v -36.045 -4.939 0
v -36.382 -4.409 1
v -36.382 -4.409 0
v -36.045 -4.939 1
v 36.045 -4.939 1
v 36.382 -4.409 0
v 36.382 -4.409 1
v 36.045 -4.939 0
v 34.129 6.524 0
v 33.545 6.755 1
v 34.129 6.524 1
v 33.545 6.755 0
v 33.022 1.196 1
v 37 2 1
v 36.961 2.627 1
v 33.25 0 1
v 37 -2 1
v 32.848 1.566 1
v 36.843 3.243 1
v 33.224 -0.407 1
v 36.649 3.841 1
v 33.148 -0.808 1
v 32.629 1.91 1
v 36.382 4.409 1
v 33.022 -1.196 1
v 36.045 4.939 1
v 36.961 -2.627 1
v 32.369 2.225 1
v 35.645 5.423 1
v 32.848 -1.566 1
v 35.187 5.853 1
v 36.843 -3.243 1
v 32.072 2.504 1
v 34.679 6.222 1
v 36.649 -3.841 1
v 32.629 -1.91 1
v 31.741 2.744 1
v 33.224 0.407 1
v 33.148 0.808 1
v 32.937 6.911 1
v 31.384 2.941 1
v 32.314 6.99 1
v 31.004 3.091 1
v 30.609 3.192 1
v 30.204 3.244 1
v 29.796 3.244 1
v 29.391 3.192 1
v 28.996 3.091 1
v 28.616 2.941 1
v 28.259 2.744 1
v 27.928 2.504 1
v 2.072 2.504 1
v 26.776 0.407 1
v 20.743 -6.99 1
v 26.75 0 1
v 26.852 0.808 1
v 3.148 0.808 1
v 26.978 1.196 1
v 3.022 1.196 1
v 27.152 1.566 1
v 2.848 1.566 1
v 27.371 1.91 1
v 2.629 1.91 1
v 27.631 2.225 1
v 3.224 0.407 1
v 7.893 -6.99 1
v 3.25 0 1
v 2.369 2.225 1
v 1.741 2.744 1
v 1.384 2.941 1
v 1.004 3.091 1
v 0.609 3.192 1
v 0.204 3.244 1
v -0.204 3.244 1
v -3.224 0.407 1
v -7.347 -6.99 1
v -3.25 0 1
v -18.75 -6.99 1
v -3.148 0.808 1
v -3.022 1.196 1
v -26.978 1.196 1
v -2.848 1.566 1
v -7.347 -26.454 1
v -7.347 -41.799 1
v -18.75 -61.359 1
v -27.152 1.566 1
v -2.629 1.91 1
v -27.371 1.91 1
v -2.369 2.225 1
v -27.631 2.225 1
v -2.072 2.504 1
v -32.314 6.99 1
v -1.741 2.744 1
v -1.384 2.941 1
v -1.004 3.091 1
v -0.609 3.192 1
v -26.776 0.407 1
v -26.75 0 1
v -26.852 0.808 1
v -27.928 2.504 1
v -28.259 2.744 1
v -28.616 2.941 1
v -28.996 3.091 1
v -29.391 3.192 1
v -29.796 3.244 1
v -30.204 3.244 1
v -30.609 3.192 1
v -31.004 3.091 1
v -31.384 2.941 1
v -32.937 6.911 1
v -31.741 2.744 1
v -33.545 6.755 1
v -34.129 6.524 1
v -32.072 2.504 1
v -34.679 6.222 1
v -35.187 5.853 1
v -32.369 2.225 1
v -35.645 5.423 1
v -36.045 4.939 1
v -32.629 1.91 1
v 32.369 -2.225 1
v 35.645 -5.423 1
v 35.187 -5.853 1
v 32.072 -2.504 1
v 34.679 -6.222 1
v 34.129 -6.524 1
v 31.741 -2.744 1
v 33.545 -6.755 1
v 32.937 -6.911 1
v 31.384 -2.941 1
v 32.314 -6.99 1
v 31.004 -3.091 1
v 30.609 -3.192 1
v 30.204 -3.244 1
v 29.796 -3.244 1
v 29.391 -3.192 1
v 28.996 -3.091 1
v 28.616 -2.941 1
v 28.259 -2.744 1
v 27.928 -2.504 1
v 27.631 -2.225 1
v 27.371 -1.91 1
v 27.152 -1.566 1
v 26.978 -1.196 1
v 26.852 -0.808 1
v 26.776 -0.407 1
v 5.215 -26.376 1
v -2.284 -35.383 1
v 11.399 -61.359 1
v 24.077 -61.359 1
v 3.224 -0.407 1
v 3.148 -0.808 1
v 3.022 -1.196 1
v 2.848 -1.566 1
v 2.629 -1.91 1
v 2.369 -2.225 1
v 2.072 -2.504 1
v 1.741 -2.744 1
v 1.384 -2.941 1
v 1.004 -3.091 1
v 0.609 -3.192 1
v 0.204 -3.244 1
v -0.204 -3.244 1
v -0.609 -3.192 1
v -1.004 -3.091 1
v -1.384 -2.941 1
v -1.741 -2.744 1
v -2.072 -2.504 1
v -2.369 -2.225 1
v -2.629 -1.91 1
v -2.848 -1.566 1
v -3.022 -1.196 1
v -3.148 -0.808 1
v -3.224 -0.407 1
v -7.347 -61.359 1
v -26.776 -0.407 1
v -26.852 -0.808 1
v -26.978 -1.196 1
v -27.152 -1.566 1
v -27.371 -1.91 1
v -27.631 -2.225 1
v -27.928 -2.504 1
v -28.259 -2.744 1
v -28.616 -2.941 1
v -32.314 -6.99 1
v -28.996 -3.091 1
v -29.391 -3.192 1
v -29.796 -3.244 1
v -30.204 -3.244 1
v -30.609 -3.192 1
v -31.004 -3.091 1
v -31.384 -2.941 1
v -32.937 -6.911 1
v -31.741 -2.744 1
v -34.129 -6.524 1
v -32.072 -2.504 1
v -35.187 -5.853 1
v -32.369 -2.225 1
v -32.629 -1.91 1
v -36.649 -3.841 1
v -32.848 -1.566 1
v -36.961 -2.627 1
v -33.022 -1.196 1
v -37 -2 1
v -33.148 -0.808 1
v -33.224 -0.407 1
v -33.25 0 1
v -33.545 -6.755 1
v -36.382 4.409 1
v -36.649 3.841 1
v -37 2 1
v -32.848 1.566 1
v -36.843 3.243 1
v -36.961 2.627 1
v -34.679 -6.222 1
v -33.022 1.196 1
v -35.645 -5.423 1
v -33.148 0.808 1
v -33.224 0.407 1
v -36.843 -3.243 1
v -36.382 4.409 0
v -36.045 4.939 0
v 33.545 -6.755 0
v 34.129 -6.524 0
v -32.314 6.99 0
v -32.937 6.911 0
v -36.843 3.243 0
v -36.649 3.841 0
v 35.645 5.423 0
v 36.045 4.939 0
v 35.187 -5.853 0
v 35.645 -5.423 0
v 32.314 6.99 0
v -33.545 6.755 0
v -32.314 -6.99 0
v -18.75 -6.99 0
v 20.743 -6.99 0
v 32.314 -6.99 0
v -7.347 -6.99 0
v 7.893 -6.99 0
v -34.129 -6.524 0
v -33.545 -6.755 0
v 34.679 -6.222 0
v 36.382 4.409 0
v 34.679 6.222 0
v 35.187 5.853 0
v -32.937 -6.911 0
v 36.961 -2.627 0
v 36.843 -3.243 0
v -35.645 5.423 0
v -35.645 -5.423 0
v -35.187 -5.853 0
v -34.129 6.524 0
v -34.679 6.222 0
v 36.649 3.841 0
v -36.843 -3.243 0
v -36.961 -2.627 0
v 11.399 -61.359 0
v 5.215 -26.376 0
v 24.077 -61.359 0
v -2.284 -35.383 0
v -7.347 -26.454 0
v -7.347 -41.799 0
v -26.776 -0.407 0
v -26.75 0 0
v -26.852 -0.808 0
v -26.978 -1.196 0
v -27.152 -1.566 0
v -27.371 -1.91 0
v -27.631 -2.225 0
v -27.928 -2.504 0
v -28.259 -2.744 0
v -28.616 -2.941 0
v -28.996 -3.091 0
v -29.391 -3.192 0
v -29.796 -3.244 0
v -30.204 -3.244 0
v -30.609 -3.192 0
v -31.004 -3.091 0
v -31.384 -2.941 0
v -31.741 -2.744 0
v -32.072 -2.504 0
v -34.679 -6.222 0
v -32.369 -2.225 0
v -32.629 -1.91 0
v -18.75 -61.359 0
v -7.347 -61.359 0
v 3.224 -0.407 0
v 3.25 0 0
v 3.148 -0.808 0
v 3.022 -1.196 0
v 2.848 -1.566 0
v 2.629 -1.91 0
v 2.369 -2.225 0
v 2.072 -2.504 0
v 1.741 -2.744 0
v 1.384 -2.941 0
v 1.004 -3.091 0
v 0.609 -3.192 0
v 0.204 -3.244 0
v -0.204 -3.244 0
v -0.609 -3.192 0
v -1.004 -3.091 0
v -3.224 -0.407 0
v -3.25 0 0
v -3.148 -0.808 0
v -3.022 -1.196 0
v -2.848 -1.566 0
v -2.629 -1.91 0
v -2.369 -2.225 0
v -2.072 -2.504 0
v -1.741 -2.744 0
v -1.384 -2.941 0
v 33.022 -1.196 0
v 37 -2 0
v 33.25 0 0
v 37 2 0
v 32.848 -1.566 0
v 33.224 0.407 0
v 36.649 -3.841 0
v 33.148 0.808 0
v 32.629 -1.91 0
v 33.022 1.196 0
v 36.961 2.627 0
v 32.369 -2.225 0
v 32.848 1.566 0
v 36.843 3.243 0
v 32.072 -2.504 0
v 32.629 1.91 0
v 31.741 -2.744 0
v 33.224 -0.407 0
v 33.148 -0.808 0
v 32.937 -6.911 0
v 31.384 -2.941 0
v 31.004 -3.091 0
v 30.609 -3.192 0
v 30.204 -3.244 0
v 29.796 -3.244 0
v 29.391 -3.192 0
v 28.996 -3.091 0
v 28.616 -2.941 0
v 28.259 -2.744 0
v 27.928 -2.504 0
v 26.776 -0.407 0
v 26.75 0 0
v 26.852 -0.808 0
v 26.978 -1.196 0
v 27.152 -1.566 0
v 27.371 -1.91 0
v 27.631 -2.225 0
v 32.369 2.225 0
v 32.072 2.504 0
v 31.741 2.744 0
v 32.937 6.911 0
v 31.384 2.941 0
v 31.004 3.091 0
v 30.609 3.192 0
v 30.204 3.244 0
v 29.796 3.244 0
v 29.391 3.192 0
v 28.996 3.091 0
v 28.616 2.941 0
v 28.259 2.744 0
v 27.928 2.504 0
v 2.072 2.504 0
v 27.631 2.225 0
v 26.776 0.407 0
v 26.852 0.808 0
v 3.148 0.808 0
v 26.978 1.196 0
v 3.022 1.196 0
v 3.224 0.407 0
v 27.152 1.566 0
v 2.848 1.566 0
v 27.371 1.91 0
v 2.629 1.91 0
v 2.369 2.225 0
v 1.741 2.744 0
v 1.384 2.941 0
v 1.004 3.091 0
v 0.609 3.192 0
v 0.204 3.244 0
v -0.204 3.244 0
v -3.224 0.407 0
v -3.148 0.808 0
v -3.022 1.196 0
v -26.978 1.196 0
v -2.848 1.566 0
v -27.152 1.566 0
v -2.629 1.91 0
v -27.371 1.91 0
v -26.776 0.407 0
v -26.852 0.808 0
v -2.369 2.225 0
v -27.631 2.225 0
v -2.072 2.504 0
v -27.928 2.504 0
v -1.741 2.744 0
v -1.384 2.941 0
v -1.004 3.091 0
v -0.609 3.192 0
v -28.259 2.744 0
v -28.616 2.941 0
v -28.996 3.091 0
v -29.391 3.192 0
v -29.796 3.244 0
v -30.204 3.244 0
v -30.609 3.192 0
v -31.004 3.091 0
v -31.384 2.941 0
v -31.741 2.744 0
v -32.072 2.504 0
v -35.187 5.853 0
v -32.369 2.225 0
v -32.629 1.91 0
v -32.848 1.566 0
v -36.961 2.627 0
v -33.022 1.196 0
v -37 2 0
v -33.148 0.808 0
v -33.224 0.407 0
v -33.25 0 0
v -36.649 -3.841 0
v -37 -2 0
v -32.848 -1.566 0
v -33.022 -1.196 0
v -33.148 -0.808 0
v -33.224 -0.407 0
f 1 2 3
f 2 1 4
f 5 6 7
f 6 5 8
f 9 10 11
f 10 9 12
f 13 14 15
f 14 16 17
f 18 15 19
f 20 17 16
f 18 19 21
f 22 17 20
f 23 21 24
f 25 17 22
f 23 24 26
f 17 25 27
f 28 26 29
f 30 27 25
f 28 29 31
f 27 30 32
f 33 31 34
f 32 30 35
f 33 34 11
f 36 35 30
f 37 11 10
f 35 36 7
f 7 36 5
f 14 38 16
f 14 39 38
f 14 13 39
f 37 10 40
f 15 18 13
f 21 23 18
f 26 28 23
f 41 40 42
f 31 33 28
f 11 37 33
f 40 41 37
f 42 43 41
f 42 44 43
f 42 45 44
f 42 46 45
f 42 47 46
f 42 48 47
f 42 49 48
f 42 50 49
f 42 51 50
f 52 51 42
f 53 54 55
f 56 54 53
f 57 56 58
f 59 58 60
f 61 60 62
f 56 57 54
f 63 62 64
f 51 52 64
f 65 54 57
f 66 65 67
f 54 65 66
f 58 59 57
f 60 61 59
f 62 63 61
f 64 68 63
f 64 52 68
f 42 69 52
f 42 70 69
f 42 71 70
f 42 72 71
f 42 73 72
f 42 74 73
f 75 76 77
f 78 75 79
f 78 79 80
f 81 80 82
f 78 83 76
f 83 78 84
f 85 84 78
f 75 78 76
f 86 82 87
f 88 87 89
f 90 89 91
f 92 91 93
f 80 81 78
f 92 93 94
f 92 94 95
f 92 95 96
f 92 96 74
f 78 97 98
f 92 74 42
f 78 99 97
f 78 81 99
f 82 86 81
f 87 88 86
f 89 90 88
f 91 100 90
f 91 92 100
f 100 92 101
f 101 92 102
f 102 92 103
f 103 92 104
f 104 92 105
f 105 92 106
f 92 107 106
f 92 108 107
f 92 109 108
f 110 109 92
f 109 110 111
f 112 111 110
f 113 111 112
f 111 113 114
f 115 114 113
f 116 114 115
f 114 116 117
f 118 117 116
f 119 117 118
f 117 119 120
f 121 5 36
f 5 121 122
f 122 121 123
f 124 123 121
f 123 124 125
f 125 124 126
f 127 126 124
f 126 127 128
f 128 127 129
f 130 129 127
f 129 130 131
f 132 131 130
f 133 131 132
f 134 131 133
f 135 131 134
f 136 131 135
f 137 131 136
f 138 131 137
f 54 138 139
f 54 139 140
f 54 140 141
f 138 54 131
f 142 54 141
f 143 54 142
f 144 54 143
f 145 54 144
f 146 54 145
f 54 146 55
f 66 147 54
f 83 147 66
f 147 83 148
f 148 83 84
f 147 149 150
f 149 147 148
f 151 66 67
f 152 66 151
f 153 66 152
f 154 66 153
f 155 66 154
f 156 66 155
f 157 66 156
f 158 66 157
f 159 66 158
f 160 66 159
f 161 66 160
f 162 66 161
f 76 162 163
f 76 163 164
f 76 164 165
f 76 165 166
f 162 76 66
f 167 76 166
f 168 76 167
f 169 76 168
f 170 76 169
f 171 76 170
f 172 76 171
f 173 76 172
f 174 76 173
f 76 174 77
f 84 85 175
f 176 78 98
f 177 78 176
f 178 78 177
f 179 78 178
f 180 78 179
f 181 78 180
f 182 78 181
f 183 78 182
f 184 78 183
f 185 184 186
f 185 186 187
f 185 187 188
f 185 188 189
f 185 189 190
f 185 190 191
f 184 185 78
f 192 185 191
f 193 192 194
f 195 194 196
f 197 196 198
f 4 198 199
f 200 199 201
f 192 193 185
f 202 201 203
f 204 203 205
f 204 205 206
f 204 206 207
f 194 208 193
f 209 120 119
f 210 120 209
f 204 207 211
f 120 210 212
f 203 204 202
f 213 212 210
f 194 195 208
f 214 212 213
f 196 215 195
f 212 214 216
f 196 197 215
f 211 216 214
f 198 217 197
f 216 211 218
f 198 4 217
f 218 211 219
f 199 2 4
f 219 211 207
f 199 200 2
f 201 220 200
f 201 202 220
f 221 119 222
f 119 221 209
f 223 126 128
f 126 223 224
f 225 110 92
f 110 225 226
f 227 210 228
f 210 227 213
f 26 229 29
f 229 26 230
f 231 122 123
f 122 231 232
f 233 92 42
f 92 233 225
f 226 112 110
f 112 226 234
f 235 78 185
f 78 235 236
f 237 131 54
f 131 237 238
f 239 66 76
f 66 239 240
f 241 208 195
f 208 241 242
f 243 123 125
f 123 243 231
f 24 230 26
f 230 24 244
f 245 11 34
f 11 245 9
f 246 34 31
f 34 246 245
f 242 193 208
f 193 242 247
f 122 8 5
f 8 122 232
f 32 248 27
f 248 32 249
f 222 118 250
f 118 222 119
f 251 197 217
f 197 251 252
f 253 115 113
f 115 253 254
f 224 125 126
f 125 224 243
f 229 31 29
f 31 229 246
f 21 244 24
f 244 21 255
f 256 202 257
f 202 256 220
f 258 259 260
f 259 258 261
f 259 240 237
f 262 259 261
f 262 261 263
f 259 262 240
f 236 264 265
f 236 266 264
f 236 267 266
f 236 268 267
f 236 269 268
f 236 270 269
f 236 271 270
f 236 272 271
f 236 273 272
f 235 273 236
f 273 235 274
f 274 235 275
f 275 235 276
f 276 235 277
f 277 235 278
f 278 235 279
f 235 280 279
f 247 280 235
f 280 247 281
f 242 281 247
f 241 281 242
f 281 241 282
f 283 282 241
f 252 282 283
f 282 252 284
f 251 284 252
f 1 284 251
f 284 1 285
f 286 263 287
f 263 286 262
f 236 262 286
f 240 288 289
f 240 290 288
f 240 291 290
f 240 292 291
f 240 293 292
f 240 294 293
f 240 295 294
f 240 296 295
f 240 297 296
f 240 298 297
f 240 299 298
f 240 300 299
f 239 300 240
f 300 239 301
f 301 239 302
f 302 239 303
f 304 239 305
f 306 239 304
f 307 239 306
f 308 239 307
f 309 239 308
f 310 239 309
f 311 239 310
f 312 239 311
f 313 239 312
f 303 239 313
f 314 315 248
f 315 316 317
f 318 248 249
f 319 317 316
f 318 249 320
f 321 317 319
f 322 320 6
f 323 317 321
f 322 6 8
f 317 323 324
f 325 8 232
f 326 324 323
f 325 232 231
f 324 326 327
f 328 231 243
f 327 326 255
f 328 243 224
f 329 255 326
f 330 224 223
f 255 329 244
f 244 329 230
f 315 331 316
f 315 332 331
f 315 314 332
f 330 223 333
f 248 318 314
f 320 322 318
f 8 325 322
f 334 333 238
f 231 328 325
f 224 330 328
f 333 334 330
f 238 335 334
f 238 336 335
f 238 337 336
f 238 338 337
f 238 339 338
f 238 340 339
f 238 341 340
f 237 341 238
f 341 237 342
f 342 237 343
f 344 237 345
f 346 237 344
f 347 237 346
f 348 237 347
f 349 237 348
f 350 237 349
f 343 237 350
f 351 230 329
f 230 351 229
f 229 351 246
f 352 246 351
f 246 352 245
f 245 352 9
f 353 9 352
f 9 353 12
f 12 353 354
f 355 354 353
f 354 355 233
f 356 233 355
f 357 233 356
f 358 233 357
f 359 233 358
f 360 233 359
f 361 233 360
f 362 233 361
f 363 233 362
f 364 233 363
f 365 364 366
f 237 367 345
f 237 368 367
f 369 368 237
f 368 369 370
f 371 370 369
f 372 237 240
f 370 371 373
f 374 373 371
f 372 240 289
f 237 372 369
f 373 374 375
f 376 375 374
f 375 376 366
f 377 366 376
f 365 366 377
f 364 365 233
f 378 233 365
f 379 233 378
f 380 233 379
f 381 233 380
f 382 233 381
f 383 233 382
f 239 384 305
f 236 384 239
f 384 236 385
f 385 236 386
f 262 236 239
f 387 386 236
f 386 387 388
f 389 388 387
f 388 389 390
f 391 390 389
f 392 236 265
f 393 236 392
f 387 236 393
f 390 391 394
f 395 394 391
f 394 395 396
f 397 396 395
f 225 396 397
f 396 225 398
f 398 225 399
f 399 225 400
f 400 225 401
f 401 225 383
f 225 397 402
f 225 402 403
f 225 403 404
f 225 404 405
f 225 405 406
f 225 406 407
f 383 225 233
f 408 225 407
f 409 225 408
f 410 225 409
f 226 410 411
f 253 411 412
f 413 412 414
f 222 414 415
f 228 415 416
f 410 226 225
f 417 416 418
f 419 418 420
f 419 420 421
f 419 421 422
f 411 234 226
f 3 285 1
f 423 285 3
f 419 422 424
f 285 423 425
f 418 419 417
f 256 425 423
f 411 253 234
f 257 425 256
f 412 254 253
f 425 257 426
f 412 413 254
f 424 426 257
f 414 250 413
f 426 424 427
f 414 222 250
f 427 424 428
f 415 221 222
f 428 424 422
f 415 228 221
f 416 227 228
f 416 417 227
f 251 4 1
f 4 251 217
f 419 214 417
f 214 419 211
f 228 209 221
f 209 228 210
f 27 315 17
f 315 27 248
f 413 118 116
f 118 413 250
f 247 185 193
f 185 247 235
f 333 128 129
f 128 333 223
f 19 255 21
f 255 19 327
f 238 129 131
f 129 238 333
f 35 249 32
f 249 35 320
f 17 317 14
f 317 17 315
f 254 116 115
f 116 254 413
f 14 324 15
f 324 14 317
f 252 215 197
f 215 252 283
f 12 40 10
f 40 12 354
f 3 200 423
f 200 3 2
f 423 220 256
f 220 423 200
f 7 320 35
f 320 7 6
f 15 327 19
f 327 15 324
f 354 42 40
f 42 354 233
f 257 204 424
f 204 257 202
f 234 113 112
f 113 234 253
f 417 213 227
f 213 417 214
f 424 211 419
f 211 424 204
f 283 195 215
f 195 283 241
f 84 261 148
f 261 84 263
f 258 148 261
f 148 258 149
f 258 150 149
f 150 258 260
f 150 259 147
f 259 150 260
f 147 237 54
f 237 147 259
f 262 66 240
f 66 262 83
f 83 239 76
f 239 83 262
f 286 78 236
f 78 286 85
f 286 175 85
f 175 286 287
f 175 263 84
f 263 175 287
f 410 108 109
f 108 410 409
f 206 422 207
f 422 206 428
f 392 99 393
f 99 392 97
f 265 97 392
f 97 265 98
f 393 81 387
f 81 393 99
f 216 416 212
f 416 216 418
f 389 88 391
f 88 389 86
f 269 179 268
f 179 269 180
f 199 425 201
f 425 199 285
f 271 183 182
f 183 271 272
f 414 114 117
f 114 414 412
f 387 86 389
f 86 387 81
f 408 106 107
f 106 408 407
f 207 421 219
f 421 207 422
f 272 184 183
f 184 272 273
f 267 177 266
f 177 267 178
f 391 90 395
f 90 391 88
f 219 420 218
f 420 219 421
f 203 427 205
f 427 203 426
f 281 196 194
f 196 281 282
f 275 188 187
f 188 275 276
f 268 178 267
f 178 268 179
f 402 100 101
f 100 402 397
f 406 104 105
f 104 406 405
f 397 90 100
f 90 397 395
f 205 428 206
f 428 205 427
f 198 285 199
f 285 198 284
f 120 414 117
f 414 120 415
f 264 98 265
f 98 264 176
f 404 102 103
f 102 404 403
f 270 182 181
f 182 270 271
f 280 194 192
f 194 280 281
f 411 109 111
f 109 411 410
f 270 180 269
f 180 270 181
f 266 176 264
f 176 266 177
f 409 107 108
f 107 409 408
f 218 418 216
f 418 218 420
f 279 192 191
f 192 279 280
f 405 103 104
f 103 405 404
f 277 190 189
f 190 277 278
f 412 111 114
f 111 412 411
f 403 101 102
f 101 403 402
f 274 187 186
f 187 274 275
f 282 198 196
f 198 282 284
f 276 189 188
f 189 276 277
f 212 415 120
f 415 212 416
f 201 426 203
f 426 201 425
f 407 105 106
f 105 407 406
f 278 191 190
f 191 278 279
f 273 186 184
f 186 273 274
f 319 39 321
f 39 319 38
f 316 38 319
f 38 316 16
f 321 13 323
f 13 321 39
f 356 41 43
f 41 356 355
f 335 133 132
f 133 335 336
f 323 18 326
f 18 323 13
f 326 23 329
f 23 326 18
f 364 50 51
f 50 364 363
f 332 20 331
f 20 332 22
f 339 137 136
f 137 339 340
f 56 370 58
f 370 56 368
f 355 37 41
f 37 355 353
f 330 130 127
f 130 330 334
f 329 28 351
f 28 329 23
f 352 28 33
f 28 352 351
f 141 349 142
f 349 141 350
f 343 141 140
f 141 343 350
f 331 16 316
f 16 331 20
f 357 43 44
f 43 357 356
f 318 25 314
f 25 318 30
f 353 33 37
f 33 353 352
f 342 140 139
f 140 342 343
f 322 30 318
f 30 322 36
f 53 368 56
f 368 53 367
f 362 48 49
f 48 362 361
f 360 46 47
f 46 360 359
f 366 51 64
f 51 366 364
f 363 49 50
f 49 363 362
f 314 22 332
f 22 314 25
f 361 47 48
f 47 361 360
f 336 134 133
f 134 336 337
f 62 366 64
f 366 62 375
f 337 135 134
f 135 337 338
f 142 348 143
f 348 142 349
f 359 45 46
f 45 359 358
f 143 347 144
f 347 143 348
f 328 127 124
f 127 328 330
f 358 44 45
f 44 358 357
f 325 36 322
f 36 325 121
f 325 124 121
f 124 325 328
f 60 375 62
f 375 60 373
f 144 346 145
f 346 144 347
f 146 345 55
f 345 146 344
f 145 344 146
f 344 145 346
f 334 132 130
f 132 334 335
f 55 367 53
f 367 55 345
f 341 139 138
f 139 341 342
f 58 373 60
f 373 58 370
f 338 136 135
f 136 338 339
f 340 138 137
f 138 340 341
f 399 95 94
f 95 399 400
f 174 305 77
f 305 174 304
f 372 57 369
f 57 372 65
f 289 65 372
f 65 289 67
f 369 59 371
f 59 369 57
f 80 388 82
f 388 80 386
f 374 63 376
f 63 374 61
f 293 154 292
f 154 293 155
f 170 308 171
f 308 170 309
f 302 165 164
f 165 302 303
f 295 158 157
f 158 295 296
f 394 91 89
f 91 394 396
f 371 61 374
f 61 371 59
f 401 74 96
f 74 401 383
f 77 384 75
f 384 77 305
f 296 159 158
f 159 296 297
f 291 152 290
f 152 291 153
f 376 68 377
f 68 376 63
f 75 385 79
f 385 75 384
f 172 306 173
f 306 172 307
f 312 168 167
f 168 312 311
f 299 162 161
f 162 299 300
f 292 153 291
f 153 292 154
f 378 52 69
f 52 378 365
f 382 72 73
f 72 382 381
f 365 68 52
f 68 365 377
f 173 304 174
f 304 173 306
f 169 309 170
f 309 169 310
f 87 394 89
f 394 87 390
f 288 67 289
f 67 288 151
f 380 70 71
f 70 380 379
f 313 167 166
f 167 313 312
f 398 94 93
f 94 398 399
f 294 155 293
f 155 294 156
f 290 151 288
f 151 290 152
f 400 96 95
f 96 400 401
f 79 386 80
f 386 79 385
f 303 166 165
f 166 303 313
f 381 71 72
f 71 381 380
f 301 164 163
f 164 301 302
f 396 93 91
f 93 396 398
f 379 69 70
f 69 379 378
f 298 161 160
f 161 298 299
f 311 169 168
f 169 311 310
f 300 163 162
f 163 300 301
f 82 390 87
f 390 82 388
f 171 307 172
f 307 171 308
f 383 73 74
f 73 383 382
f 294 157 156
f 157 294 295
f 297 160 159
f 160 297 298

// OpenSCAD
$fn = 50;


difference() {
	union() {
		translate(v = [0, 0, 0]) {
			rotate(a = [0, 0, 0]) {
				hull() {
					translate(v = [-32.0000000000, 2.0000000000, 0]) {
						rotate(a = [0, 0, 0]) {
							translate(v = [0, 0, 0]) {
								rotate(a = [0, 0, 0]) {
									cylinder(h = 1, r = 5);
								}
							}
						}
					}
					translate(v = [32.0000000000, 2.0000000000, 0]) {
						rotate(a = [0, 0, 0]) {
							translate(v = [0, 0, 0]) {
								rotate(a = [0, 0, 0]) {
									cylinder(h = 1, r = 5);
								}
							}
						}
					}
					translate(v = [-32.0000000000, -2.0000000000, 0]) {
						rotate(a = [0, 0, 0]) {
							translate(v = [0, 0, 0]) {
								rotate(a = [0, 0, 0]) {
									cylinder(h = 1, r = 5);
								}
							}
						}
					}
					translate(v = [32.0000000000, -2.0000000000, 0]) {
						rotate(a = [0, 0, 0]) {
							translate(v = [0, 0, 0]) {
								rotate(a = [0, 0, 0]) {
									cylinder(h = 1, r = 5);
								}
							}
						}
					}
				}
			}
		}
		translate(v = [0, -5, 0]) {
			rotate(a = [0, 0, 0]) {
				linear_extrude(height = 1) {
					text(font = "DejaVu Sans Mono:style=Bold", halign = "center", size = 57.0000000000, text = "K", valign = "top");
				}
			}
		}
	}
	union() {
		translate(v = [-30.0000000000, 0.0000000000, -125.0000000000]) {
			rotate(a = [0, 0, 0]) {
				cylinder(h = 250, r = 3.2500000000);
			}
		}
		translate(v = [30.0000000000, 0.0000000000, -125.0000000000]) {
			rotate(a = [0, 0, 0]) {
				cylinder(h = 250, r = 3.2500000000);
			}
		}
		translate(v = [30.0000000000, 0.0000000000, -125.0000000000]) {
			rotate(a = [0, 0, 0]) {
				cylinder(h = 250, r = 3.2500000000);
			}
		}
		translate(v = [0, 0, -125.0000000000]) {
			rotate(a = [0, 0, 0]) {
				cylinder(h = 250, r = 3.2500000000);
			}
		}
	}
}
